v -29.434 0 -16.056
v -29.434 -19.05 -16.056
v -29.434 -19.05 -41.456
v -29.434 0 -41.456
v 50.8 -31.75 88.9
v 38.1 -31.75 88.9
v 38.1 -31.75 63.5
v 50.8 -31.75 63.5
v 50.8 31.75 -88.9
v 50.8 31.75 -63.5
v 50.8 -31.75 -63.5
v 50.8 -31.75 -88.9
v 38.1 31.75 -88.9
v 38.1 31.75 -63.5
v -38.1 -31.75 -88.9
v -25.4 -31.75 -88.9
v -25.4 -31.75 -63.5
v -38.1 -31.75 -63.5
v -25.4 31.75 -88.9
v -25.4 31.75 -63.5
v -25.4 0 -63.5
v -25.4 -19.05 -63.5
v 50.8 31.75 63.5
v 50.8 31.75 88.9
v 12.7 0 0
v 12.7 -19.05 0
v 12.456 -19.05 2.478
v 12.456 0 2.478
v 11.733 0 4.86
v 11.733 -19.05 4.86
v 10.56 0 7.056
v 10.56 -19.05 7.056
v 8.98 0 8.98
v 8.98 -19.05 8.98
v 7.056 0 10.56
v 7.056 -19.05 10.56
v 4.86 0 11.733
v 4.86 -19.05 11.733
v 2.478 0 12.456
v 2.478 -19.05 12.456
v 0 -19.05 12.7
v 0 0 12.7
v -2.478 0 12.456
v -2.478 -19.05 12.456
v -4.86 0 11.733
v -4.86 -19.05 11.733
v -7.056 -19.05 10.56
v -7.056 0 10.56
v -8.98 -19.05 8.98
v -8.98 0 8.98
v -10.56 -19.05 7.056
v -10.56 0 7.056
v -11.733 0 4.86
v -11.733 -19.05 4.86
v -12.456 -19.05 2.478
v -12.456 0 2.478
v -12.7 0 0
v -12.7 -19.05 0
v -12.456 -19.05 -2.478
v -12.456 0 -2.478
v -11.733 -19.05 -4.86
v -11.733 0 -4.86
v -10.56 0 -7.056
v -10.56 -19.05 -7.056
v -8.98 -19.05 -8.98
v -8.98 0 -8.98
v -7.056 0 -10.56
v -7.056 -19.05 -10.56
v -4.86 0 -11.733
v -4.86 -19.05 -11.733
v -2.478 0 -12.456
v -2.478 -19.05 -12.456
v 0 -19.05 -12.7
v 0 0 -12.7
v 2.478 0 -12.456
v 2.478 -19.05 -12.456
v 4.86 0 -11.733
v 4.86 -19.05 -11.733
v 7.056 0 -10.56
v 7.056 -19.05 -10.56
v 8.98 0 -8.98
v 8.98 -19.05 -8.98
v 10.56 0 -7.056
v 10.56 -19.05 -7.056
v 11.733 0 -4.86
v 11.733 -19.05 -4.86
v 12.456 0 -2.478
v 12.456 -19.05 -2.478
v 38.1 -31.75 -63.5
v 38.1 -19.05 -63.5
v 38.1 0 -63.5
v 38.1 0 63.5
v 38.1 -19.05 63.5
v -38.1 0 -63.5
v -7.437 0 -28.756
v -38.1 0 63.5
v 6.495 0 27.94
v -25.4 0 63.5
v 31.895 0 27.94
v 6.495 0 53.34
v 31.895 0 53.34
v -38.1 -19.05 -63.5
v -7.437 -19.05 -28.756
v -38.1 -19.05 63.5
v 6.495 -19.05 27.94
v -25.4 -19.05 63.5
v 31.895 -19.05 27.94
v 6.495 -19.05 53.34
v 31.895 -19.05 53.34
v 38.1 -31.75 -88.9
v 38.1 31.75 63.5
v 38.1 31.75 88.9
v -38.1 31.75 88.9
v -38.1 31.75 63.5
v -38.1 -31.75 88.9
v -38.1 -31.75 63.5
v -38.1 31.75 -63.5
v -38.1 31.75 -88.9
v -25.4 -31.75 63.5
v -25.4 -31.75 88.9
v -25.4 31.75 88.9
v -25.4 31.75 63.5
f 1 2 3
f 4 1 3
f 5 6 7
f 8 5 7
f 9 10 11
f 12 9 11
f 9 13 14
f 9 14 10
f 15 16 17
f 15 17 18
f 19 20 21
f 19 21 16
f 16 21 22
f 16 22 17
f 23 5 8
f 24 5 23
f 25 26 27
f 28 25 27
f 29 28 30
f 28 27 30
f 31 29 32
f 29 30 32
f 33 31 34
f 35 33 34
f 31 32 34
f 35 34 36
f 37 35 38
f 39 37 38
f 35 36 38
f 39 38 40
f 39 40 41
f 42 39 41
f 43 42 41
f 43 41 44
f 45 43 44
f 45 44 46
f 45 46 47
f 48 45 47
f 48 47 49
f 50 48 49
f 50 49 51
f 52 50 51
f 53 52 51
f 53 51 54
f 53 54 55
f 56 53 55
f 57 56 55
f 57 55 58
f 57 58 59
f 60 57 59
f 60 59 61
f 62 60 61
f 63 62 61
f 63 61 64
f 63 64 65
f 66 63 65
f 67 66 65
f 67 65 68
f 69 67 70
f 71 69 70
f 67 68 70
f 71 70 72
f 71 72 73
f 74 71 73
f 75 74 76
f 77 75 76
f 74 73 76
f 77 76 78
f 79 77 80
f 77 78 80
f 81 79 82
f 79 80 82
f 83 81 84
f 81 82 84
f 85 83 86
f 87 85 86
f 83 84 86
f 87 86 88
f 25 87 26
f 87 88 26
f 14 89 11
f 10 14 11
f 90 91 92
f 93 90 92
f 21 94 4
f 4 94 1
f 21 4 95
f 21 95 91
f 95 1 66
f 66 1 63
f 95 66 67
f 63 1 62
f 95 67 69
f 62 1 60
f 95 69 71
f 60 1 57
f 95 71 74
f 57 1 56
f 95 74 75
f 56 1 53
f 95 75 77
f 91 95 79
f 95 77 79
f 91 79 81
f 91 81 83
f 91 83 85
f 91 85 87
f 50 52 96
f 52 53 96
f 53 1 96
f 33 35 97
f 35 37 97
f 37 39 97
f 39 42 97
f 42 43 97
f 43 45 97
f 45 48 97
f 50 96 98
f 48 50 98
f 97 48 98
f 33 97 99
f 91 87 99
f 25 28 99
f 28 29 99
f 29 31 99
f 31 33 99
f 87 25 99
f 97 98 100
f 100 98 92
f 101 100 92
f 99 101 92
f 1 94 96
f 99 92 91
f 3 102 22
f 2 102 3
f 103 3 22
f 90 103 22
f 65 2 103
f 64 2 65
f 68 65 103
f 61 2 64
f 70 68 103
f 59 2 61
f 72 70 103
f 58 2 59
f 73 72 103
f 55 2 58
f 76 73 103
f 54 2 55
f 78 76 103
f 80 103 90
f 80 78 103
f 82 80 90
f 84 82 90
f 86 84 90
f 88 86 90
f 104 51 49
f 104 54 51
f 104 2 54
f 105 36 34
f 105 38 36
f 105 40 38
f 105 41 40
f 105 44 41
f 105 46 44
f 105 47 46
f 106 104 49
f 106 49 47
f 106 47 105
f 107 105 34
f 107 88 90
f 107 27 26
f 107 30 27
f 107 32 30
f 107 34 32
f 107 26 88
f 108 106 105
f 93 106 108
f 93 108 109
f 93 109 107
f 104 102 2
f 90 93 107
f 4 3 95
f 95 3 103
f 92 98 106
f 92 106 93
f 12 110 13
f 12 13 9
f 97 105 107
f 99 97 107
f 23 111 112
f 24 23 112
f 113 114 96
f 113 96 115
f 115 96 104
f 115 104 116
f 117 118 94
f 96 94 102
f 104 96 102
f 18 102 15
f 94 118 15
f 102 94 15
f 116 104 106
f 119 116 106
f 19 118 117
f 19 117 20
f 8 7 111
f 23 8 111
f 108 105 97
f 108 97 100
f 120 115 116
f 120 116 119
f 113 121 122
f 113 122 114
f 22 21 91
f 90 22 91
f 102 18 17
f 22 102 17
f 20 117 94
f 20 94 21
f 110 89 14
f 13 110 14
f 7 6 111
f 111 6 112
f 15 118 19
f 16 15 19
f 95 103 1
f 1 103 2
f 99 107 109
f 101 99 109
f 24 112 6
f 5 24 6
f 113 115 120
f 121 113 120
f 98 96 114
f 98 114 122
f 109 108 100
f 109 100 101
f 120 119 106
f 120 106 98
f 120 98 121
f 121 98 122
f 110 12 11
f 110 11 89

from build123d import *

# Parameters (mm, degrees)
F0_W      = 76.2
F0_H      = 127
F1_DEPTH  = 19.05
F2_W      = 25.4
F2_H      = 25.4
F3_DEPTH  = 50.8
F4_R      = 12.7
F5_DEPTH  = 50.8
F7_DEPTH  = 50.8
F9_DEPTH  = 25.4
F11_DEPTH = 25.4
F13_DEPTH = 25.4
F15_DEPTH = 12.7


with BuildPart() as f1:
    # F0 (on Front) → F1 (new body)
    with BuildSketch(Plane.XZ):
        Rectangle(F0_W, F0_H)
    extrude(amount=F1_DEPTH)

    # F2 (on face) → F3 (cut)
    with BuildSketch(Plane.XZ.offset(19.05)):
        with Locations((19.194767, 40.639999)):
            Rectangle(F2_W, F2_H)
    extrude(amount=-F3_DEPTH, mode=Mode.SUBTRACT)

    # F4 (on face) → F5 (cut)
    with BuildSketch(Plane.XZ.offset(19.05)):
        Circle(F4_R)
    extrude(amount=-F5_DEPTH, mode=Mode.SUBTRACT)

    # F6 (on face) → F7 (cut)
    with BuildSketch(Plane.XZ.offset(19.05)):
        Polygon((-7.436684, -28.755962), (-29.433729, -16.055962), (-29.433729, -41.455962), align=None)
    extrude(amount=-F7_DEPTH, mode=Mode.SUBTRACT)

    # F8 (on face) → F9 (join)
    with BuildSketch(Plane(origin=(0, 0, -63.5), x_dir=(1, 0, 0), z_dir=(0, 0, -1))):
        Polygon((-38.1, 31.75), (-38.1, 19.05), (-38.1, -31.75), (-25.4, -31.75), (-25.4, 19.05), (-25.4, 31.75), align=None)
    extrude(amount=F9_DEPTH)

    # F10 (on face) → F11 (join)
    with BuildSketch(Plane.XY.offset(63.5)):
        Polygon((-38.1, -31.75), (-25.4, -31.75), (-25.4, -19.05), (-25.4, 31.75), (-38.1, 31.75), (-38.1, -19.05), align=None)
    extrude(amount=F11_DEPTH)


with BuildPart() as f13:
    # F12 (on face) → F13 (new body)
    with BuildSketch(Plane(origin=(0, 0, -63.5), x_dir=(1, 0, 0), z_dir=(0, 0, -1))):
        Polygon((38.1, 31.75), (38.1, 19.05), (38.1, -31.75), (50.8, -31.75), (50.8, 31.75), align=None)
    extrude(amount=F13_DEPTH)


with BuildPart() as f15:
    # F14 (on face) → F15 (new body)
    with BuildSketch(Plane.YZ.offset(38.1)):
        Polygon((-31.75, 63.5), (-19.05, 63.5), (31.75, 63.5), (31.75, 88.9), (-31.75, 88.9), align=None)
    extrude(amount=F15_DEPTH)


solid = Compound([f1.part, f13.part, f15.part])
